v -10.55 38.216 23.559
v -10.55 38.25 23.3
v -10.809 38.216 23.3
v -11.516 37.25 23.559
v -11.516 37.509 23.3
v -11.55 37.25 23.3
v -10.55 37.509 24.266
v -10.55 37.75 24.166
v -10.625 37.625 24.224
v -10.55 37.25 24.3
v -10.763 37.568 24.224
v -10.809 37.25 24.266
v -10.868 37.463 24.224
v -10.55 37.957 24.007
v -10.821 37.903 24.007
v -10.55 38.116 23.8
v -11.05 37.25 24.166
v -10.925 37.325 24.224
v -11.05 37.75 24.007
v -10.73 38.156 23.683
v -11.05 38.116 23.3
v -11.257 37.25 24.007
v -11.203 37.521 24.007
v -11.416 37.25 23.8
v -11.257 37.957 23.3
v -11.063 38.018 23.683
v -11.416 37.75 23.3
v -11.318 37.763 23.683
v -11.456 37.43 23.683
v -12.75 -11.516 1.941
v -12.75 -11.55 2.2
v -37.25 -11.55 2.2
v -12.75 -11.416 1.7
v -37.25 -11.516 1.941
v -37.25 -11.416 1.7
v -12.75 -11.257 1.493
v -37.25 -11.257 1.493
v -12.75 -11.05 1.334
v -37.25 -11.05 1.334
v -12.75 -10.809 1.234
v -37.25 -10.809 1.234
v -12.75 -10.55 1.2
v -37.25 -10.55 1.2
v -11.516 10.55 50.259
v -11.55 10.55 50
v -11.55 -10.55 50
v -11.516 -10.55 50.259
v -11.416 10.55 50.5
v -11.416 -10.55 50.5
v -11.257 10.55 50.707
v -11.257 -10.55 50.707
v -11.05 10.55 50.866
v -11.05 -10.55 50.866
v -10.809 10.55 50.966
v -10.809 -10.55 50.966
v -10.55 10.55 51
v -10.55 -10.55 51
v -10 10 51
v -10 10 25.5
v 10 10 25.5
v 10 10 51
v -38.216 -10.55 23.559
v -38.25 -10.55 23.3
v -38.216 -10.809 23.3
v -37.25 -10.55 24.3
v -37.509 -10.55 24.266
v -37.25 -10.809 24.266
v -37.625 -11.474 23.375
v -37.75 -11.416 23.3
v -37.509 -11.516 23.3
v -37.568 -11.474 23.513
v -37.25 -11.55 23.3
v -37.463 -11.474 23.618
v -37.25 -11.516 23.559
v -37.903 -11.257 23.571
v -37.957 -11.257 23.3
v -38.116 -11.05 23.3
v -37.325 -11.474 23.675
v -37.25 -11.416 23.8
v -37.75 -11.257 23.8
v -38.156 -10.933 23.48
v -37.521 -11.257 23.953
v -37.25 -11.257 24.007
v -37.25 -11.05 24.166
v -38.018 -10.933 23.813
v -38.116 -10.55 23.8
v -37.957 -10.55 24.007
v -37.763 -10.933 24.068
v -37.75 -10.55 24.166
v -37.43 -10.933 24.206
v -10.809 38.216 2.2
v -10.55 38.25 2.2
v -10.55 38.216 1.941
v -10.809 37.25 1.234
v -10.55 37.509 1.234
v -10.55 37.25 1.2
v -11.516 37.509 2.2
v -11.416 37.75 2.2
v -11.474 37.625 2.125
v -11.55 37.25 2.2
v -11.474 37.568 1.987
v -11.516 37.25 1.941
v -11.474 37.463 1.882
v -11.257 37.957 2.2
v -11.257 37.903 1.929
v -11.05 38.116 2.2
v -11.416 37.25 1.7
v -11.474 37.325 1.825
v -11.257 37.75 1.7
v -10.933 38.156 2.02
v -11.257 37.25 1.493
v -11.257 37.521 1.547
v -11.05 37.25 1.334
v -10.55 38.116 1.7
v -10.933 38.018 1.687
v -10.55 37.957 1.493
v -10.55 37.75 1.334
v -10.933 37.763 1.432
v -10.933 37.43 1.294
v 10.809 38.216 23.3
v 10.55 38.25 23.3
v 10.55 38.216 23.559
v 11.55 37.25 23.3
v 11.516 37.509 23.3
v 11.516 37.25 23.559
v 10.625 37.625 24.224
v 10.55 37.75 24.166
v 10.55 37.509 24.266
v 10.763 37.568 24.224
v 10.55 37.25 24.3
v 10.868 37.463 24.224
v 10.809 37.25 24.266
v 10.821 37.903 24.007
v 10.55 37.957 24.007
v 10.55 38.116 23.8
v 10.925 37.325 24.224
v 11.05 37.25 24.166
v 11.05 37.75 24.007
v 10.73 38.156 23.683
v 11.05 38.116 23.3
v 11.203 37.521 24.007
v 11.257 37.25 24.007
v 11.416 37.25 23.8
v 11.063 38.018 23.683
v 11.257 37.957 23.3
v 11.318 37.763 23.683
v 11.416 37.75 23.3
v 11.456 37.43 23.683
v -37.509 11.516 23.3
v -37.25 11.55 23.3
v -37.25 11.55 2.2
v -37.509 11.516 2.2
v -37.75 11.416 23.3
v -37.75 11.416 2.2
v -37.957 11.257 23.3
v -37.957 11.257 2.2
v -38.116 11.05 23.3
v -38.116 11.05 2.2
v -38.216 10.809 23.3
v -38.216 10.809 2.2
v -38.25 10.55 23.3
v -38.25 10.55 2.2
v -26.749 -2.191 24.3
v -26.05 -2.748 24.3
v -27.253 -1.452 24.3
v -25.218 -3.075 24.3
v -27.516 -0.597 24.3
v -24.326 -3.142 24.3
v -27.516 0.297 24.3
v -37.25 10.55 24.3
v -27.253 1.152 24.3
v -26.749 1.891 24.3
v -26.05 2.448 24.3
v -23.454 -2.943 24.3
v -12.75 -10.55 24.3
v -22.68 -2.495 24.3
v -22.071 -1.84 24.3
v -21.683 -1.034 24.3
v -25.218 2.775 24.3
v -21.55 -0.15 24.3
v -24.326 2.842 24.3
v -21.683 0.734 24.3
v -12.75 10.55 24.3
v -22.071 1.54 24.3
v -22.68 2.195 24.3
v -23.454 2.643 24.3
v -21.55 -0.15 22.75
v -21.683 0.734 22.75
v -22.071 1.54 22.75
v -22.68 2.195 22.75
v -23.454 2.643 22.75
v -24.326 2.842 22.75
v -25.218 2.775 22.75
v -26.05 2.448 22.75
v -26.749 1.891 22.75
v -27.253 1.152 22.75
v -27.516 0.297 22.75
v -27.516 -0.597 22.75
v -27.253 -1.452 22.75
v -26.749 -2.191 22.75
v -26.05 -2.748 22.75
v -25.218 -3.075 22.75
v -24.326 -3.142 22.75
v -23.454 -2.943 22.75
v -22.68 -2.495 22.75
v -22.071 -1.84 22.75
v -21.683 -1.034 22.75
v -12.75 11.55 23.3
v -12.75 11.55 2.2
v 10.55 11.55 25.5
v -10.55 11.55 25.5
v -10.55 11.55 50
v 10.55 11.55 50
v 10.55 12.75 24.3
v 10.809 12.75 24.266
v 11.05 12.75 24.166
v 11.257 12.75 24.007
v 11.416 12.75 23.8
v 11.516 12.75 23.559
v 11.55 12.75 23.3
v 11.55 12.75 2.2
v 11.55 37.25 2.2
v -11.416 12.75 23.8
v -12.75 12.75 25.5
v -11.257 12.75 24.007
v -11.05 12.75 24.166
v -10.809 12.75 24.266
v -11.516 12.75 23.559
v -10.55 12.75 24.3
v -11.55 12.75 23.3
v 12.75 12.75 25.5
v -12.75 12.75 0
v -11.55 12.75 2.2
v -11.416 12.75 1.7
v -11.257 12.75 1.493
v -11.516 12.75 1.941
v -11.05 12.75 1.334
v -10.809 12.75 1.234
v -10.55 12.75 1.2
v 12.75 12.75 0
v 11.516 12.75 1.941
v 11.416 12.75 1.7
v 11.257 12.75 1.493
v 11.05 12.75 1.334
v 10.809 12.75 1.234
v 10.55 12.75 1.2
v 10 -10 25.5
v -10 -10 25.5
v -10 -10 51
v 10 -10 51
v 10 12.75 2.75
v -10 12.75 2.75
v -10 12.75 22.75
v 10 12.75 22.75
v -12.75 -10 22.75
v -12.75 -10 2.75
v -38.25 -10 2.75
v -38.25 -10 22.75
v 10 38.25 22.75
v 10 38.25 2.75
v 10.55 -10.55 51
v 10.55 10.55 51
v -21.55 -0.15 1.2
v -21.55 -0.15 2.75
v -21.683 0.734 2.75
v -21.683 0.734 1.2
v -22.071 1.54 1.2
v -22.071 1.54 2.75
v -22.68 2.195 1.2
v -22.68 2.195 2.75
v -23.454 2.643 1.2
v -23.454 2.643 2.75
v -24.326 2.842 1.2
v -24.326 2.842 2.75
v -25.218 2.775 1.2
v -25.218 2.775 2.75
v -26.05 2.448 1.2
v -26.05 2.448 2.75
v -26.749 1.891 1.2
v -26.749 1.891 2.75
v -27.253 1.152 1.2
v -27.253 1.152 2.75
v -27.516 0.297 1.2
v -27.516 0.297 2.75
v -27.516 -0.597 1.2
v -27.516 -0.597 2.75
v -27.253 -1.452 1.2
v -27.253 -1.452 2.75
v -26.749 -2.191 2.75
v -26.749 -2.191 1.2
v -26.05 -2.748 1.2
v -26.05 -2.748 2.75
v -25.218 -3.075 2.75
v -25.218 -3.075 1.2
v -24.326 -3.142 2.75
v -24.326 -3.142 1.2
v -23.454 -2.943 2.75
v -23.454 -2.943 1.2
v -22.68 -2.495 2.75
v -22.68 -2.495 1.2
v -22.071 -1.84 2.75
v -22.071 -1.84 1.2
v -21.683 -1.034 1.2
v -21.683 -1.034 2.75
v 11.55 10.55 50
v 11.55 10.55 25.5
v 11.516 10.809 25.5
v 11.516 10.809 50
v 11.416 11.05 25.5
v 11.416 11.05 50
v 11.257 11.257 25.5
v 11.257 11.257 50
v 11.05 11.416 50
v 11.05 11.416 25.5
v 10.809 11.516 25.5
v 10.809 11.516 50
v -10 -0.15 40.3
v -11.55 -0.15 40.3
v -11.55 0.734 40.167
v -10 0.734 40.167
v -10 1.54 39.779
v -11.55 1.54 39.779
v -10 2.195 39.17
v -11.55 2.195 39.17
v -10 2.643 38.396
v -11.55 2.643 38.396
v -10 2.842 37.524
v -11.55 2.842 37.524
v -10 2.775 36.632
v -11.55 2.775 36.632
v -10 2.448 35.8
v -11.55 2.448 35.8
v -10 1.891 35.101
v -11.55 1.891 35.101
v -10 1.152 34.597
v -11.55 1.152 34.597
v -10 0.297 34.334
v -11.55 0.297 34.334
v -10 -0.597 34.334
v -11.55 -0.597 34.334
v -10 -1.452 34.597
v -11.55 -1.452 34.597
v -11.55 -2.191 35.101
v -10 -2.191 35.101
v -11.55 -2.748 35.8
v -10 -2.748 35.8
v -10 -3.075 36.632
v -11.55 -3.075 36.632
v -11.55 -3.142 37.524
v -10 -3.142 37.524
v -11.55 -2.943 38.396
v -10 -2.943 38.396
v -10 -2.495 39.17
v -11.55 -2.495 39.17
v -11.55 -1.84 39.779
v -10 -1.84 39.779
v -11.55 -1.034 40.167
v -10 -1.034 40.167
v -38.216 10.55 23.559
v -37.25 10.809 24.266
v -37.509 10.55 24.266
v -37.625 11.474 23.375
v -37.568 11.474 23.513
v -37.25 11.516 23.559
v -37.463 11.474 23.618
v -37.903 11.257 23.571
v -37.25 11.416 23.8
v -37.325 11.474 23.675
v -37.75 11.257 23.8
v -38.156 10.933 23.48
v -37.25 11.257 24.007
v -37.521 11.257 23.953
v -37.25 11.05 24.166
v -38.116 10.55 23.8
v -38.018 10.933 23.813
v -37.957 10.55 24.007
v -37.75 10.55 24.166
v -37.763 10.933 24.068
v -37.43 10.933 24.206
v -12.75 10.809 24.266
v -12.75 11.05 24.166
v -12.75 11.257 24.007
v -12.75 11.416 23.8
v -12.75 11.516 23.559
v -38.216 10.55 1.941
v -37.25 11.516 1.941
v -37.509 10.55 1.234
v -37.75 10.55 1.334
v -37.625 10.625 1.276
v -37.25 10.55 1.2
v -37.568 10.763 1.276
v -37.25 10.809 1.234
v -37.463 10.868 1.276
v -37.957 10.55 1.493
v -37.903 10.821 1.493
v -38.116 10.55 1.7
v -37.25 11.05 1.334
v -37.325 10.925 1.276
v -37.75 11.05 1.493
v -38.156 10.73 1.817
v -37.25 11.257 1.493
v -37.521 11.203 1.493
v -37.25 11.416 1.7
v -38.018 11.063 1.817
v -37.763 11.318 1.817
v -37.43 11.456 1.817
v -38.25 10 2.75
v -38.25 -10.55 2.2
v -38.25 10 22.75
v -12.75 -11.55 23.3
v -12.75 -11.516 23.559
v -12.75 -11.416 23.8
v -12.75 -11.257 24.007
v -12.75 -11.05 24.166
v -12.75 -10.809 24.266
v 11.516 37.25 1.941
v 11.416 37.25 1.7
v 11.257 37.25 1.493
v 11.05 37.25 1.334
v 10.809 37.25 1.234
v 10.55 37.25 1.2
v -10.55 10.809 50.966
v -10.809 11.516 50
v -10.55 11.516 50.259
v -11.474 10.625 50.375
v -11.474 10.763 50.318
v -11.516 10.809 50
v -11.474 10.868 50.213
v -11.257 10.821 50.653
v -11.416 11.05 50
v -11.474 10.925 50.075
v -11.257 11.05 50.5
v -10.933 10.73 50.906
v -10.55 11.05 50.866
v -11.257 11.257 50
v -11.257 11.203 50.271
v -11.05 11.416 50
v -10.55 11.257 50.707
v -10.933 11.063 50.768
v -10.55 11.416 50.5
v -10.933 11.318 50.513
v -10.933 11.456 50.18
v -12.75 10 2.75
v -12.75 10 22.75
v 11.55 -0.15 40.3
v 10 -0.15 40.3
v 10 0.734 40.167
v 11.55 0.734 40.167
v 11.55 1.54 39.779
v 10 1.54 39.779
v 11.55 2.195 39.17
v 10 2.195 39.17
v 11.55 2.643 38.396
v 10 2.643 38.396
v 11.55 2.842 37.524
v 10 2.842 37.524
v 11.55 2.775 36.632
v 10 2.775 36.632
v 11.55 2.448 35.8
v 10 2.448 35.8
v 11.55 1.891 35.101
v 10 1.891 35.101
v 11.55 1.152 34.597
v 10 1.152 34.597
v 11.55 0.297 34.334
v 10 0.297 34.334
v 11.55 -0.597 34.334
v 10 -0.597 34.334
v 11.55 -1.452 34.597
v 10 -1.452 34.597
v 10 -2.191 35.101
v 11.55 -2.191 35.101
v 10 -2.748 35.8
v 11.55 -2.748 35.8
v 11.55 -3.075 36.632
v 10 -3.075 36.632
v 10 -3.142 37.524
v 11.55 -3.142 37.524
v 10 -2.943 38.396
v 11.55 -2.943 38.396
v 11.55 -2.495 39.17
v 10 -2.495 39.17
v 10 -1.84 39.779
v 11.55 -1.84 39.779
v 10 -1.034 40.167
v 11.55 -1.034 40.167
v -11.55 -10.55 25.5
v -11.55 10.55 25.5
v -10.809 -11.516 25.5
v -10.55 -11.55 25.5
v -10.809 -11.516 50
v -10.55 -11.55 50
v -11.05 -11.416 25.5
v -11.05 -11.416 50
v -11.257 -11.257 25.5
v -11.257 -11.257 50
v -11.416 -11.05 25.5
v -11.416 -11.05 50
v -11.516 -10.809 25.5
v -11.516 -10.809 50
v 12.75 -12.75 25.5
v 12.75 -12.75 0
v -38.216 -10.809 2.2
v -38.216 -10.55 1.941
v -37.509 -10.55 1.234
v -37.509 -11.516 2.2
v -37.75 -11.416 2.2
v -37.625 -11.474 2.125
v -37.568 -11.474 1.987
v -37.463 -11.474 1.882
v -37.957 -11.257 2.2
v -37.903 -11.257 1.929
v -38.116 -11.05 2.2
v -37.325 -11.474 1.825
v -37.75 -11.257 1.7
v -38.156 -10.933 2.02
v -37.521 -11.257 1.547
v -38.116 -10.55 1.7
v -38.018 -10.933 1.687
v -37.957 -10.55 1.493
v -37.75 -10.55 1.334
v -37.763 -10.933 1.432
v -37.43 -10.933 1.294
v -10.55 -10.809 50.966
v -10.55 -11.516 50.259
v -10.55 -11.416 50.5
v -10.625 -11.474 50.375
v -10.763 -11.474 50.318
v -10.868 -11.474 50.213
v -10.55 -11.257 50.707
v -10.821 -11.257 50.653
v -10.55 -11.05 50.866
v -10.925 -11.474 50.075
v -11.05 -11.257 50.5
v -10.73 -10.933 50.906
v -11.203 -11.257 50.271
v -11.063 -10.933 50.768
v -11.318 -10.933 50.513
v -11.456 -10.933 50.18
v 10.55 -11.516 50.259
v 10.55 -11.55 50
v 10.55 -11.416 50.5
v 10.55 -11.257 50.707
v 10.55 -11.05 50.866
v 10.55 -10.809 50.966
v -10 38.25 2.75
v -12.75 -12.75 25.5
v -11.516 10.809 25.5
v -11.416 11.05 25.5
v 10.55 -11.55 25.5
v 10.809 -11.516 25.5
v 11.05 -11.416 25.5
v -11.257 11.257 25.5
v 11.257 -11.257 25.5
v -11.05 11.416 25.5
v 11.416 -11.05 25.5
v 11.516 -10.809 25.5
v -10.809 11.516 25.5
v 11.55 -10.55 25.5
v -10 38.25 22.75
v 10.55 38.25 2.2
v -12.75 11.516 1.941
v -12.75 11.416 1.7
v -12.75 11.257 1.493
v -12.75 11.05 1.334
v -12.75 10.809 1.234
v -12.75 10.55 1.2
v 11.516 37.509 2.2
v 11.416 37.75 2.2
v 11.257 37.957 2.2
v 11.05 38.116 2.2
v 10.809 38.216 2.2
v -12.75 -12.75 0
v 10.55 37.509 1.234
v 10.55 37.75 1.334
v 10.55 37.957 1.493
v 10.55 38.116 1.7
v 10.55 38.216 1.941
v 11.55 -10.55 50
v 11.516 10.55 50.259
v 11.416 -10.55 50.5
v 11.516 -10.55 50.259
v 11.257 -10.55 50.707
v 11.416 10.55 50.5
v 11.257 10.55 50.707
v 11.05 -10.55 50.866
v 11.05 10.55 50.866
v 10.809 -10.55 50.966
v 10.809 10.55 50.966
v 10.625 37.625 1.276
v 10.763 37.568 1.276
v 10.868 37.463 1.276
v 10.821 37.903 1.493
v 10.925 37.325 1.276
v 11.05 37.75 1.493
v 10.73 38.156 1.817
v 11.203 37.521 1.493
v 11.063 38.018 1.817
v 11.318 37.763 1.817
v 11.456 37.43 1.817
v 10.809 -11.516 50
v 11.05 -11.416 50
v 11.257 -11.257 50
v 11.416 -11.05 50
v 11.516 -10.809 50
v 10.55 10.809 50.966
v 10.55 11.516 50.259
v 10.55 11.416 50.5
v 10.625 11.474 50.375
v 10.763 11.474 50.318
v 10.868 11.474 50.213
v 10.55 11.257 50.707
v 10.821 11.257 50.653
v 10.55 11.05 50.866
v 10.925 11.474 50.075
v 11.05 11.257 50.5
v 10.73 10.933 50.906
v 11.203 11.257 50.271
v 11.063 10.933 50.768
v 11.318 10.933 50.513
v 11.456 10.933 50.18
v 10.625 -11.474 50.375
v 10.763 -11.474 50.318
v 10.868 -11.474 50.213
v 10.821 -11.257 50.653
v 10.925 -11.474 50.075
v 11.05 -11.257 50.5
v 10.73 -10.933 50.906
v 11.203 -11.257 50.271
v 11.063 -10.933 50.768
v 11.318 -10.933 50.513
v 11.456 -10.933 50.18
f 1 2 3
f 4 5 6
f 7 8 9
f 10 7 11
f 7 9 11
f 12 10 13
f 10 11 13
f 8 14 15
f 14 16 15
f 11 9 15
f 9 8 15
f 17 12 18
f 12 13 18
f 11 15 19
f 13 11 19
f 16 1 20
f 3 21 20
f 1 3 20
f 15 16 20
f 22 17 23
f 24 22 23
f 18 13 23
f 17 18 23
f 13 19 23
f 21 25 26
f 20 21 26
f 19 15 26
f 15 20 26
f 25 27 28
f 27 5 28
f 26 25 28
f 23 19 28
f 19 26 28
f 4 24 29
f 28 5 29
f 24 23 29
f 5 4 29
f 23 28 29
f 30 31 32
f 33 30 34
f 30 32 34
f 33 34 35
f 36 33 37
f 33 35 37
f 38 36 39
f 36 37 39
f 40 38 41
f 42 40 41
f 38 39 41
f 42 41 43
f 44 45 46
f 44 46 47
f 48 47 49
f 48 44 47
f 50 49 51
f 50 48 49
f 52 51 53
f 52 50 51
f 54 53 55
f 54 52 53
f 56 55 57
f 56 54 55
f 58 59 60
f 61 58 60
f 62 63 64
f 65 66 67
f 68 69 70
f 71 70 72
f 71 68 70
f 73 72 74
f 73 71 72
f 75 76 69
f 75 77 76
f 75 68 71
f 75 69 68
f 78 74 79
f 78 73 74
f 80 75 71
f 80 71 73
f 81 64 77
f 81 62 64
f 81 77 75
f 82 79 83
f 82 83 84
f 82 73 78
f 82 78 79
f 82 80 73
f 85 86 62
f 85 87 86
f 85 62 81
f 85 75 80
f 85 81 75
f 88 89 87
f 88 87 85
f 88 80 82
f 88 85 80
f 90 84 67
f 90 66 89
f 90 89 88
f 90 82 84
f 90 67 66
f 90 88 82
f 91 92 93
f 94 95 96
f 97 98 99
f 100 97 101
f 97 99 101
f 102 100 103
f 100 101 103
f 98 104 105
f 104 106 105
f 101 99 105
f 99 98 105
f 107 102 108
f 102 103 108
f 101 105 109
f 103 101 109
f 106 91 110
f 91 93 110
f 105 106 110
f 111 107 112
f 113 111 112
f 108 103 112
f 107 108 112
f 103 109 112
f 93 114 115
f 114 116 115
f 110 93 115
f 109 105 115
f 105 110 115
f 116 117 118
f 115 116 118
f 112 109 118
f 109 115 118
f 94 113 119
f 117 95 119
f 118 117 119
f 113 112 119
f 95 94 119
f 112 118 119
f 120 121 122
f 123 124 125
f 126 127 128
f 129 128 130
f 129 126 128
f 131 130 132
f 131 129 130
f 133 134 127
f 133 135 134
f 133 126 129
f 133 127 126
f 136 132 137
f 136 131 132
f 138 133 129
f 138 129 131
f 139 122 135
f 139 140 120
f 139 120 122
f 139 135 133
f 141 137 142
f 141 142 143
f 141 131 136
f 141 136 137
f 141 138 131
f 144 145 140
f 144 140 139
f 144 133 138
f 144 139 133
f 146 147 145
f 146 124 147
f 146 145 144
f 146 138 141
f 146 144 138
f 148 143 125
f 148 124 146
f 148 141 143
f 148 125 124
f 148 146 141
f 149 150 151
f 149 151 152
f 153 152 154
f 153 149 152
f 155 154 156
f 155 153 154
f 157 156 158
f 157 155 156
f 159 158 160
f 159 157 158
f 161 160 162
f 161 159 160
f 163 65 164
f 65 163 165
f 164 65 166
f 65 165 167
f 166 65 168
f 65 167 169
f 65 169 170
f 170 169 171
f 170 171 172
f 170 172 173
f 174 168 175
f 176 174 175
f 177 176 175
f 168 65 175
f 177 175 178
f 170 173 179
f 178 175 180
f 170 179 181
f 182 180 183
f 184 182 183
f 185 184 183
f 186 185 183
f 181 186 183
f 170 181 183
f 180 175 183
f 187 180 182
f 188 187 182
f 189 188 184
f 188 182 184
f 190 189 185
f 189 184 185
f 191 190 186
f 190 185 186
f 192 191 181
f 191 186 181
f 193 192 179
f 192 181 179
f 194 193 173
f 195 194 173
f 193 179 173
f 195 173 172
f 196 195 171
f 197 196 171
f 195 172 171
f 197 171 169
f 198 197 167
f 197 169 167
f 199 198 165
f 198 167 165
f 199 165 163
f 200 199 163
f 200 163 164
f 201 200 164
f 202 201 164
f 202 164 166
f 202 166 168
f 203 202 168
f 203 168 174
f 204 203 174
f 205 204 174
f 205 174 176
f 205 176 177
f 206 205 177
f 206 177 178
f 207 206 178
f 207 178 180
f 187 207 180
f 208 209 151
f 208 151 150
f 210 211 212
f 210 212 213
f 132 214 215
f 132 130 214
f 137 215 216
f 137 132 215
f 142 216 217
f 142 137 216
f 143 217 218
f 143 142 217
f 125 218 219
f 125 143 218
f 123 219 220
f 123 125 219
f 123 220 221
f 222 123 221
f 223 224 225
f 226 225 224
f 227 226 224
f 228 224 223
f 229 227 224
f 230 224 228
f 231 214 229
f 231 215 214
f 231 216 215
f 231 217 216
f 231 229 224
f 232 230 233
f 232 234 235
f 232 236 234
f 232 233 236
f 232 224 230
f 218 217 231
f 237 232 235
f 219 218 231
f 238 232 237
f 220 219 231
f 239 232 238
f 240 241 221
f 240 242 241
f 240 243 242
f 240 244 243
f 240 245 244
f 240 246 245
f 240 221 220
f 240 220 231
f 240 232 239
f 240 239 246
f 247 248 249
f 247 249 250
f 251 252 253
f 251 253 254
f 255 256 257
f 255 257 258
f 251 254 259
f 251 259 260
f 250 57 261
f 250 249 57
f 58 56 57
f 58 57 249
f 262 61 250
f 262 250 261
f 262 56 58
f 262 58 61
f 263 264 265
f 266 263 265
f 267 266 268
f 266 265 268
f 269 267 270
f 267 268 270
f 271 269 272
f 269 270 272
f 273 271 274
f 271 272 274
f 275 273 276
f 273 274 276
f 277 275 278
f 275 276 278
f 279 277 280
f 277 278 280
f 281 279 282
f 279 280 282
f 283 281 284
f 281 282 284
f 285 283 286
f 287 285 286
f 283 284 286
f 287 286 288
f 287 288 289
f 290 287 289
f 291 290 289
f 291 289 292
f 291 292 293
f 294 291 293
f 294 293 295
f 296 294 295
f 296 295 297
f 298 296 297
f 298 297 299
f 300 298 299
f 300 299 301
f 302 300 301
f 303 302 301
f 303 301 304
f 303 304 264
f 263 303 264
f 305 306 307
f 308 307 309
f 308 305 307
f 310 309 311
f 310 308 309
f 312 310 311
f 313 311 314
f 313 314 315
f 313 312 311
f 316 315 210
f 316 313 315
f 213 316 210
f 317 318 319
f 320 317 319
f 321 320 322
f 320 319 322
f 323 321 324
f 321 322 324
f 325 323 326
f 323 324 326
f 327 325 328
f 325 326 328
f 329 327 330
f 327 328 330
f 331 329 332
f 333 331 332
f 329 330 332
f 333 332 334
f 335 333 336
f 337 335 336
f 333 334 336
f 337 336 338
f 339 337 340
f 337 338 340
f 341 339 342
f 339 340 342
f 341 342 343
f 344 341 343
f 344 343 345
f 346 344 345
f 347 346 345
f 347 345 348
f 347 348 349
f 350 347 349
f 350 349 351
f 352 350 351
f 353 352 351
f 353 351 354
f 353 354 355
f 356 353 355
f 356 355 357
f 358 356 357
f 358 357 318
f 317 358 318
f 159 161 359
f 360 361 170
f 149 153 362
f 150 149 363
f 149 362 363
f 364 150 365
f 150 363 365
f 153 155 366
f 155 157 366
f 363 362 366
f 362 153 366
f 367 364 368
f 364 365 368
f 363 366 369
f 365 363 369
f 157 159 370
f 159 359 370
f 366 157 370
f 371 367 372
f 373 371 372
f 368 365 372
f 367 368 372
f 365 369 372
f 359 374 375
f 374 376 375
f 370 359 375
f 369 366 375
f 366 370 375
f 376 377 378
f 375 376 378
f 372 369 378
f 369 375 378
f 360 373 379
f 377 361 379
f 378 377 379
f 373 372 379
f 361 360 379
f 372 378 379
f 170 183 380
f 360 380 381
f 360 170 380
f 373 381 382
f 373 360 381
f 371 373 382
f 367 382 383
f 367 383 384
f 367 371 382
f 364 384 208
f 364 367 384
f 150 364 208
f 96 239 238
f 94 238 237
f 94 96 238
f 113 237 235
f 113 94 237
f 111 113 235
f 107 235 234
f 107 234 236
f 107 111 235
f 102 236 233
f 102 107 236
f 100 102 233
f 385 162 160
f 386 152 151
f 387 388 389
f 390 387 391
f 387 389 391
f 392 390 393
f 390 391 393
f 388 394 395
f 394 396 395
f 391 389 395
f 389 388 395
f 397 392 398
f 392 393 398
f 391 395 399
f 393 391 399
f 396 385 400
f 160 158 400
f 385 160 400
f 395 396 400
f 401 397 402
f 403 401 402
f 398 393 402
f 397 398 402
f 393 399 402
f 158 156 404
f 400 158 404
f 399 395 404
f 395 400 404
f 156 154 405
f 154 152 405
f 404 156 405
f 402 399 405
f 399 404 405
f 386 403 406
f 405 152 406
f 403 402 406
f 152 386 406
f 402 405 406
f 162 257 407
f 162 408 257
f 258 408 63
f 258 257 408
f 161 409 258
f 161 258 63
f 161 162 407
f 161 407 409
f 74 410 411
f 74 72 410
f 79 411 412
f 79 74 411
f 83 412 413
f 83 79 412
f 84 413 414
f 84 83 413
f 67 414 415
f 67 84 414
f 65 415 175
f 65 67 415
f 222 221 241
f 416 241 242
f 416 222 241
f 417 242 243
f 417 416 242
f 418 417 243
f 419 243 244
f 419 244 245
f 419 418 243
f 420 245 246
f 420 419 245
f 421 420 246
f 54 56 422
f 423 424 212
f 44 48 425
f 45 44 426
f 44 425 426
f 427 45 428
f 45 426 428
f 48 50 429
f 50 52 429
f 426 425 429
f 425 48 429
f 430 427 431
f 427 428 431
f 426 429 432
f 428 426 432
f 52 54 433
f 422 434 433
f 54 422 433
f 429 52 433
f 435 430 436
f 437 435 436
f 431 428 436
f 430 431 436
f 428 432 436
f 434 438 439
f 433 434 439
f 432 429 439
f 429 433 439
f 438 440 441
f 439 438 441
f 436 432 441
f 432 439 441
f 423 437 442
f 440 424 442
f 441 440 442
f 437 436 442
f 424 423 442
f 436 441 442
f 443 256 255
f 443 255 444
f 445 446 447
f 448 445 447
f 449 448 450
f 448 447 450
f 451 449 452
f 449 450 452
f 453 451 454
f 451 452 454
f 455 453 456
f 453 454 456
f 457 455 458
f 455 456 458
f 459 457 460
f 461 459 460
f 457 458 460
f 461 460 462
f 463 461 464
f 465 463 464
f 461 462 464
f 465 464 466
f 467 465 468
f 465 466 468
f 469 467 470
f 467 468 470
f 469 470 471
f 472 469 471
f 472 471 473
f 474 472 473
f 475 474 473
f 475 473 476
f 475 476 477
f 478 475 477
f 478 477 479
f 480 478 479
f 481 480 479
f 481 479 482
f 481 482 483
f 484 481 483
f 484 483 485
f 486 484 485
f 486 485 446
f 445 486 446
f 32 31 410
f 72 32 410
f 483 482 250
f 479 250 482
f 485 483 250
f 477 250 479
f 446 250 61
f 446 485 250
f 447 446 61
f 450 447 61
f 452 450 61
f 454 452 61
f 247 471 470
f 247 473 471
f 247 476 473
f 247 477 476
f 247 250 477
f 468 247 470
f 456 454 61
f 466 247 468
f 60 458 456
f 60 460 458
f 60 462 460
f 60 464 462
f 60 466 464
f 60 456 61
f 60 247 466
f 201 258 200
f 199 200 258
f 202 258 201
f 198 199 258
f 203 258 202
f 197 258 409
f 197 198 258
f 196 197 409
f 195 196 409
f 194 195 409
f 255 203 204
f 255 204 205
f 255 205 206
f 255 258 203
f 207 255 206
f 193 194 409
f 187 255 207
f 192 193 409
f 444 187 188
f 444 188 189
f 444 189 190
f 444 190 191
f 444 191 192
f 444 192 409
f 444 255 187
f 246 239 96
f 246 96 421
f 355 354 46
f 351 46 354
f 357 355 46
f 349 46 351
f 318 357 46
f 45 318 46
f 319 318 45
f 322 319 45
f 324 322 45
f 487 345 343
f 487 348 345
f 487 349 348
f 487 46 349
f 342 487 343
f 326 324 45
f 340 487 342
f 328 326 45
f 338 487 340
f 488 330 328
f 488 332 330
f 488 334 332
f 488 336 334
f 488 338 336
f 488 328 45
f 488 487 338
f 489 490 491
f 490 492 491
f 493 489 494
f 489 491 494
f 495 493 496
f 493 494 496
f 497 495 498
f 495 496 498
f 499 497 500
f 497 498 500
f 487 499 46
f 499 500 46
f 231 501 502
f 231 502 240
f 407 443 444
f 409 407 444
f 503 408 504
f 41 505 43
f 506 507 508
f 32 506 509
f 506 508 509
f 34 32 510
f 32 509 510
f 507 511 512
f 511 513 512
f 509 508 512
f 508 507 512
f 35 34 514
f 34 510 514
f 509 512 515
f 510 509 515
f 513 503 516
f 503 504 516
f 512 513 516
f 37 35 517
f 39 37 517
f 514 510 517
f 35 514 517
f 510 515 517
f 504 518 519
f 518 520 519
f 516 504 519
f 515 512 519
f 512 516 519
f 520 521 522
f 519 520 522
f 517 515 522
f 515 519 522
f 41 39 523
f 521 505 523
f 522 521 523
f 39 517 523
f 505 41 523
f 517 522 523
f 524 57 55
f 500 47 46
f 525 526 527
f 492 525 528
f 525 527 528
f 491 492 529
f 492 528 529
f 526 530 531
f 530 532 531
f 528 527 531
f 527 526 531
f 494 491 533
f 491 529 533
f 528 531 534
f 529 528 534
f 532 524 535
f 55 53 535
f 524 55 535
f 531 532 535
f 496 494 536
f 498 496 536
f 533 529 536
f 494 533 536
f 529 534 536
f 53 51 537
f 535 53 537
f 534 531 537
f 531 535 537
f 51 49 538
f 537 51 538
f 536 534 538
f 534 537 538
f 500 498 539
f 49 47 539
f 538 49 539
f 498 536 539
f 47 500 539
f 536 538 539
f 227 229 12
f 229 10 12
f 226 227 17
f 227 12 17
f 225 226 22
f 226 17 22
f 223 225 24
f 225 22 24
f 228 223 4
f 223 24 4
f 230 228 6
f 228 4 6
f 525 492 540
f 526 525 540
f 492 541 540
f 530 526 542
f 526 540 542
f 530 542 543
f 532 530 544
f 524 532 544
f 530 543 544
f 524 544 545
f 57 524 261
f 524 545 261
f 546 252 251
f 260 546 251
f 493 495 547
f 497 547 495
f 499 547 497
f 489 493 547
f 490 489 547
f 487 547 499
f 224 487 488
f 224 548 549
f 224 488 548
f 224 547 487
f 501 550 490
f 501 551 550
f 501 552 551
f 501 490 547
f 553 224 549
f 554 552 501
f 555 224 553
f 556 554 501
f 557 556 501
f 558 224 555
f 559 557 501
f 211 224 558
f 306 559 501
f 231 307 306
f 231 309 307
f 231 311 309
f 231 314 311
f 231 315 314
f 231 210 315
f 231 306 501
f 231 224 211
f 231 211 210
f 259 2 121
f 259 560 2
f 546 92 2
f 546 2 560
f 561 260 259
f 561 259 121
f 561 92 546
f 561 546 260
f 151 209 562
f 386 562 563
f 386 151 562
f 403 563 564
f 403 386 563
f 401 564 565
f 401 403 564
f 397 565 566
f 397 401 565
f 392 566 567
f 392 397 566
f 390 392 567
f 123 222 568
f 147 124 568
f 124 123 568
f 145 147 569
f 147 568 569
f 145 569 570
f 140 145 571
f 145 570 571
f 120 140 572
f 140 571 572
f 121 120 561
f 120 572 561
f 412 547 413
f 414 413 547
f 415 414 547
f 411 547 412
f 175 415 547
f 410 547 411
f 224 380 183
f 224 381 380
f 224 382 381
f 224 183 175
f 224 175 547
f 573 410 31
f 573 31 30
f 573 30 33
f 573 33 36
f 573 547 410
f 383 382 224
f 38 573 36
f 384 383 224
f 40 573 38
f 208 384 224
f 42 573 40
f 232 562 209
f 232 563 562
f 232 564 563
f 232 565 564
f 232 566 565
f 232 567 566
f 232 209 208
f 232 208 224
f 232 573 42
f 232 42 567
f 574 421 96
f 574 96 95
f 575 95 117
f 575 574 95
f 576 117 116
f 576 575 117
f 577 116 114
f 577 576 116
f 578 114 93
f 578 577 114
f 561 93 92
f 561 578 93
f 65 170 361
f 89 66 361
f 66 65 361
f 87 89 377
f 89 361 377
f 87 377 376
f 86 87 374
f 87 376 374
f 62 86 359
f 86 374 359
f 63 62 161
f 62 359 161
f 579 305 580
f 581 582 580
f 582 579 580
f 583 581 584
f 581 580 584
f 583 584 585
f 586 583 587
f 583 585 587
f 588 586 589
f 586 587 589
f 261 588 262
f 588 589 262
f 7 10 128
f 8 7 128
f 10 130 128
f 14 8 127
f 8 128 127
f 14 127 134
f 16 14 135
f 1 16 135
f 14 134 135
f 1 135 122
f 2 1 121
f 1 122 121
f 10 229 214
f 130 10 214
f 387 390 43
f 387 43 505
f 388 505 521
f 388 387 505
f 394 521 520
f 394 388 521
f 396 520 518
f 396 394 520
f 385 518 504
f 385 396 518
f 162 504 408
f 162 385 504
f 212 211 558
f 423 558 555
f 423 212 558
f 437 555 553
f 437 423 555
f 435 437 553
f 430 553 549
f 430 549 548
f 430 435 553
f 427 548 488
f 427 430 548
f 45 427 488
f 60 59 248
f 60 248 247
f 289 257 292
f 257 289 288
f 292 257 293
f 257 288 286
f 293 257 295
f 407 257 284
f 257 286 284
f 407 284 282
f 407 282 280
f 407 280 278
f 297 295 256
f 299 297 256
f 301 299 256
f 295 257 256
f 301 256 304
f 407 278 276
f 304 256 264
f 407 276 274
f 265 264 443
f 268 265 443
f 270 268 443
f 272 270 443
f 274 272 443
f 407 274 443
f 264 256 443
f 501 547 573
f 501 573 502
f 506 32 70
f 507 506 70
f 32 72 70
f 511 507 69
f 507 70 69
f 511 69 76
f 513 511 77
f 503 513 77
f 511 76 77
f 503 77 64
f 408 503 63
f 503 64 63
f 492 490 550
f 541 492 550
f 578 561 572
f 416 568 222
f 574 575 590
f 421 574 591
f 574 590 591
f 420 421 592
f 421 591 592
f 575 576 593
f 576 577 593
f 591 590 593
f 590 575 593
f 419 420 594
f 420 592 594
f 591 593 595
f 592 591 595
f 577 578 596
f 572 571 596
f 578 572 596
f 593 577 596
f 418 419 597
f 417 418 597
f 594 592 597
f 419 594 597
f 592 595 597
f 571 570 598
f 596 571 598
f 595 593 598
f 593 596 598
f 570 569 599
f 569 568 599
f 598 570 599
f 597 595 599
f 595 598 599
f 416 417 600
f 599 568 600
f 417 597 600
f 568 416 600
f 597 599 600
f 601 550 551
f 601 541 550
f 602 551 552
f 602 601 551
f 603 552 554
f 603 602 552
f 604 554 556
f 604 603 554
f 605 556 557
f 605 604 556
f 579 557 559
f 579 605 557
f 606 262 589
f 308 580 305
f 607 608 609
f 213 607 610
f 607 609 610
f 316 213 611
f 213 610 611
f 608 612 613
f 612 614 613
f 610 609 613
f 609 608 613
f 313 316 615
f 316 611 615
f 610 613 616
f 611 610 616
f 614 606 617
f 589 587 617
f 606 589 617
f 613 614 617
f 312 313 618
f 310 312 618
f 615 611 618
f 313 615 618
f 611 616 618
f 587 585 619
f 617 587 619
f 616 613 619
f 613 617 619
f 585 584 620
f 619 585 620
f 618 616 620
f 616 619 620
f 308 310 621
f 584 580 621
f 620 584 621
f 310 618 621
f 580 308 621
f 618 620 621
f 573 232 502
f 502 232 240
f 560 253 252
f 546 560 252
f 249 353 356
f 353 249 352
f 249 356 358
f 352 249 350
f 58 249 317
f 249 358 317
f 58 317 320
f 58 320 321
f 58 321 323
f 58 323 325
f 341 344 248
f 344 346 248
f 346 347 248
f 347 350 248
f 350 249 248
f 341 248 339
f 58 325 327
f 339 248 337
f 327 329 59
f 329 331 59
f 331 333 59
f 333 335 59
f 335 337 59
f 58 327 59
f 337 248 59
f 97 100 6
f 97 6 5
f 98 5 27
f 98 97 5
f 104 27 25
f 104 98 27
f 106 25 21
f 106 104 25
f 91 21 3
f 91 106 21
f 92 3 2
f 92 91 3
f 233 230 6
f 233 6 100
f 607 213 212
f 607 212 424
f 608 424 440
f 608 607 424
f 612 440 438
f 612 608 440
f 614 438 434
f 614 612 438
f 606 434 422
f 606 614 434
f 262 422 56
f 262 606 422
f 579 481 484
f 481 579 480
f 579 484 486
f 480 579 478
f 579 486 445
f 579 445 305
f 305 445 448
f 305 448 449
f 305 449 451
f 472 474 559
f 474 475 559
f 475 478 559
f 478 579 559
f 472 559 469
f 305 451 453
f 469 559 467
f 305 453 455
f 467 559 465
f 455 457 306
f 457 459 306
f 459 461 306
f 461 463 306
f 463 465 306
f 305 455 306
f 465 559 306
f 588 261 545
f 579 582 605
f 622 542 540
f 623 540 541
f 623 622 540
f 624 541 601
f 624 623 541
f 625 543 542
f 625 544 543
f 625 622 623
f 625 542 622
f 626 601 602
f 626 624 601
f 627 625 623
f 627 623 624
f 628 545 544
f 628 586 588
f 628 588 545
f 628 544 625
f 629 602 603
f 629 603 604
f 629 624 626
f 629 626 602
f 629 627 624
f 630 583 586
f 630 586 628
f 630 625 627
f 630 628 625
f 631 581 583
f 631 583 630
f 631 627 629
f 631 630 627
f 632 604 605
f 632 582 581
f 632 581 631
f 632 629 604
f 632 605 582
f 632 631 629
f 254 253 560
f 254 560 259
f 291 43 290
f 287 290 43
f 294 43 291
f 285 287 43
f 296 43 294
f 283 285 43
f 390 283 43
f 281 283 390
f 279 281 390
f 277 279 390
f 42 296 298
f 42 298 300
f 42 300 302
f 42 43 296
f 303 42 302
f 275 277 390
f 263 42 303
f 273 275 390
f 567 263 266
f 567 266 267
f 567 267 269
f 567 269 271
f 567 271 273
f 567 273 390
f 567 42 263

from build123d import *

# Parameters (mm, degrees)
SKETCH1_W                = 25.5
SKETCH1_H                = 25.5
BOSS_EXTRUDE1_DEPTH      = 25.5
SKETCH2_W                = 23.1
SKETCH2_H                = 23.1
SKETCH2_W_2              = 20
SKETCH2_H_2              = 20
BOSS_EXTRUDE2_DEPTH      = 25.5
SKETCH3_W                = 23.1
SKETCH3_H                = 23.1
SKETCH3_W_2              = 20
SKETCH3_H_2              = 20
BOSS_EXTRUDE3_DEPTH      = 25.5
SKETCH4_W                = 23.1
SKETCH4_H                = 23.1
SKETCH4_W_2              = 20
SKETCH4_H_2              = 20
BOSS_EXTRUDE4_DEPTH      = 25.5
FILLET4_R                = 1
F_6_0_6_DIAMETER_HOLE1_D = 6
F_6_0_6_DIAMETER_HOLE2_D = 6


with BuildPart() as part:
    # Sketch1 → Boss-Extrude1 (new body)
    with BuildSketch(Plane.XY):
        Rectangle(SKETCH1_W, SKETCH1_H)
    extrude(amount=BOSS_EXTRUDE1_DEPTH)

    # Sketch2 → Boss-Extrude2 (add)
    with BuildSketch(Plane(origin=(0, 12.75, 0), x_dir=(1, 0, 0), z_dir=(0, 1, 0))):
        with Locations((0, -12.75)):
            Rectangle(SKETCH2_W, SKETCH2_H)
        with Locations((0, -12.75)):
            Rectangle(SKETCH2_W_2, SKETCH2_H_2, mode=Mode.SUBTRACT)
    extrude(amount=BOSS_EXTRUDE2_DEPTH)

    # Sketch3 → Boss-Extrude3 (add)
    with BuildSketch(Plane.XY.offset(25.5)):
        Rectangle(SKETCH3_W, SKETCH3_H)
        Rectangle(SKETCH3_W_2, SKETCH3_H_2, mode=Mode.SUBTRACT)
    extrude(amount=BOSS_EXTRUDE3_DEPTH)

    # Sketch4 → Boss-Extrude4 (add)
    with BuildSketch(Plane.ZY.offset(12.75)):
        with Locations((12.75, 0)):
            Rectangle(SKETCH4_W, SKETCH4_H)
        with Locations((12.75, 0)):
            Rectangle(SKETCH4_W_2, SKETCH4_H_2, mode=Mode.SUBTRACT)
    extrude(amount=BOSS_EXTRUDE4_DEPTH)

    # Fillet4
    fillet4_edges = [part.edges().sort_by_distance(p)[0] for p in [
        (11.55, 38.25, 12.75),
        (0, 38.25, 1.2),
        (-11.55, 38.25, 12.75),
        (0, 38.25, 24.3),
        (11.55, 25.5, 24.3),
        (11.55, 25.5, 1.2),
        (-11.55, 25.5, 1.2),
        (-11.55, 25.5, 24.3),
        (11.55, 0, 51),
        (0, 11.55, 51),
        (-11.55, 0, 51),
        (0, -11.55, 51),
        (11.55, -11.55, 38.25),
        (11.55, 11.55, 38.25),
        (-11.55, 11.55, 38.25),
        (-11.55, -11.55, 38.25),
        (-38.25, 0, 24.3),
        (-38.25, 11.55, 12.75),
        (-38.25, 0, 1.2),
        (-38.25, -11.55, 12.75),
        (-25.5, -11.55, 24.3),
        (-25.5, 11.55, 24.3),
        (-25.5, 11.55, 1.2),
        (-25.5, -11.55, 1.2),
    ]]
    fillet(fillet4_edges, radius=FILLET4_R)

    # Ø6.0 (6) Diameter Hole1 (through all)
    with Locations(Plane(origin=(0, 0, 1.2), x_dir=(-1, 0, 0), z_dir=(0, 0, -1))):
        with Locations((24.55, -0.15)):
            Hole(F_6_0_6_DIAMETER_HOLE1_D / 2)

    # Ø6.0 (6) Diameter Hole2 (through all)
    with Locations(Plane(origin=(11.55, 0, 0), x_dir=(0, 0, -1), z_dir=(1, 0, 0))):
        with Locations((-37.3, -0.15)):
            Hole(F_6_0_6_DIAMETER_HOLE2_D / 2)


solid = part.part
